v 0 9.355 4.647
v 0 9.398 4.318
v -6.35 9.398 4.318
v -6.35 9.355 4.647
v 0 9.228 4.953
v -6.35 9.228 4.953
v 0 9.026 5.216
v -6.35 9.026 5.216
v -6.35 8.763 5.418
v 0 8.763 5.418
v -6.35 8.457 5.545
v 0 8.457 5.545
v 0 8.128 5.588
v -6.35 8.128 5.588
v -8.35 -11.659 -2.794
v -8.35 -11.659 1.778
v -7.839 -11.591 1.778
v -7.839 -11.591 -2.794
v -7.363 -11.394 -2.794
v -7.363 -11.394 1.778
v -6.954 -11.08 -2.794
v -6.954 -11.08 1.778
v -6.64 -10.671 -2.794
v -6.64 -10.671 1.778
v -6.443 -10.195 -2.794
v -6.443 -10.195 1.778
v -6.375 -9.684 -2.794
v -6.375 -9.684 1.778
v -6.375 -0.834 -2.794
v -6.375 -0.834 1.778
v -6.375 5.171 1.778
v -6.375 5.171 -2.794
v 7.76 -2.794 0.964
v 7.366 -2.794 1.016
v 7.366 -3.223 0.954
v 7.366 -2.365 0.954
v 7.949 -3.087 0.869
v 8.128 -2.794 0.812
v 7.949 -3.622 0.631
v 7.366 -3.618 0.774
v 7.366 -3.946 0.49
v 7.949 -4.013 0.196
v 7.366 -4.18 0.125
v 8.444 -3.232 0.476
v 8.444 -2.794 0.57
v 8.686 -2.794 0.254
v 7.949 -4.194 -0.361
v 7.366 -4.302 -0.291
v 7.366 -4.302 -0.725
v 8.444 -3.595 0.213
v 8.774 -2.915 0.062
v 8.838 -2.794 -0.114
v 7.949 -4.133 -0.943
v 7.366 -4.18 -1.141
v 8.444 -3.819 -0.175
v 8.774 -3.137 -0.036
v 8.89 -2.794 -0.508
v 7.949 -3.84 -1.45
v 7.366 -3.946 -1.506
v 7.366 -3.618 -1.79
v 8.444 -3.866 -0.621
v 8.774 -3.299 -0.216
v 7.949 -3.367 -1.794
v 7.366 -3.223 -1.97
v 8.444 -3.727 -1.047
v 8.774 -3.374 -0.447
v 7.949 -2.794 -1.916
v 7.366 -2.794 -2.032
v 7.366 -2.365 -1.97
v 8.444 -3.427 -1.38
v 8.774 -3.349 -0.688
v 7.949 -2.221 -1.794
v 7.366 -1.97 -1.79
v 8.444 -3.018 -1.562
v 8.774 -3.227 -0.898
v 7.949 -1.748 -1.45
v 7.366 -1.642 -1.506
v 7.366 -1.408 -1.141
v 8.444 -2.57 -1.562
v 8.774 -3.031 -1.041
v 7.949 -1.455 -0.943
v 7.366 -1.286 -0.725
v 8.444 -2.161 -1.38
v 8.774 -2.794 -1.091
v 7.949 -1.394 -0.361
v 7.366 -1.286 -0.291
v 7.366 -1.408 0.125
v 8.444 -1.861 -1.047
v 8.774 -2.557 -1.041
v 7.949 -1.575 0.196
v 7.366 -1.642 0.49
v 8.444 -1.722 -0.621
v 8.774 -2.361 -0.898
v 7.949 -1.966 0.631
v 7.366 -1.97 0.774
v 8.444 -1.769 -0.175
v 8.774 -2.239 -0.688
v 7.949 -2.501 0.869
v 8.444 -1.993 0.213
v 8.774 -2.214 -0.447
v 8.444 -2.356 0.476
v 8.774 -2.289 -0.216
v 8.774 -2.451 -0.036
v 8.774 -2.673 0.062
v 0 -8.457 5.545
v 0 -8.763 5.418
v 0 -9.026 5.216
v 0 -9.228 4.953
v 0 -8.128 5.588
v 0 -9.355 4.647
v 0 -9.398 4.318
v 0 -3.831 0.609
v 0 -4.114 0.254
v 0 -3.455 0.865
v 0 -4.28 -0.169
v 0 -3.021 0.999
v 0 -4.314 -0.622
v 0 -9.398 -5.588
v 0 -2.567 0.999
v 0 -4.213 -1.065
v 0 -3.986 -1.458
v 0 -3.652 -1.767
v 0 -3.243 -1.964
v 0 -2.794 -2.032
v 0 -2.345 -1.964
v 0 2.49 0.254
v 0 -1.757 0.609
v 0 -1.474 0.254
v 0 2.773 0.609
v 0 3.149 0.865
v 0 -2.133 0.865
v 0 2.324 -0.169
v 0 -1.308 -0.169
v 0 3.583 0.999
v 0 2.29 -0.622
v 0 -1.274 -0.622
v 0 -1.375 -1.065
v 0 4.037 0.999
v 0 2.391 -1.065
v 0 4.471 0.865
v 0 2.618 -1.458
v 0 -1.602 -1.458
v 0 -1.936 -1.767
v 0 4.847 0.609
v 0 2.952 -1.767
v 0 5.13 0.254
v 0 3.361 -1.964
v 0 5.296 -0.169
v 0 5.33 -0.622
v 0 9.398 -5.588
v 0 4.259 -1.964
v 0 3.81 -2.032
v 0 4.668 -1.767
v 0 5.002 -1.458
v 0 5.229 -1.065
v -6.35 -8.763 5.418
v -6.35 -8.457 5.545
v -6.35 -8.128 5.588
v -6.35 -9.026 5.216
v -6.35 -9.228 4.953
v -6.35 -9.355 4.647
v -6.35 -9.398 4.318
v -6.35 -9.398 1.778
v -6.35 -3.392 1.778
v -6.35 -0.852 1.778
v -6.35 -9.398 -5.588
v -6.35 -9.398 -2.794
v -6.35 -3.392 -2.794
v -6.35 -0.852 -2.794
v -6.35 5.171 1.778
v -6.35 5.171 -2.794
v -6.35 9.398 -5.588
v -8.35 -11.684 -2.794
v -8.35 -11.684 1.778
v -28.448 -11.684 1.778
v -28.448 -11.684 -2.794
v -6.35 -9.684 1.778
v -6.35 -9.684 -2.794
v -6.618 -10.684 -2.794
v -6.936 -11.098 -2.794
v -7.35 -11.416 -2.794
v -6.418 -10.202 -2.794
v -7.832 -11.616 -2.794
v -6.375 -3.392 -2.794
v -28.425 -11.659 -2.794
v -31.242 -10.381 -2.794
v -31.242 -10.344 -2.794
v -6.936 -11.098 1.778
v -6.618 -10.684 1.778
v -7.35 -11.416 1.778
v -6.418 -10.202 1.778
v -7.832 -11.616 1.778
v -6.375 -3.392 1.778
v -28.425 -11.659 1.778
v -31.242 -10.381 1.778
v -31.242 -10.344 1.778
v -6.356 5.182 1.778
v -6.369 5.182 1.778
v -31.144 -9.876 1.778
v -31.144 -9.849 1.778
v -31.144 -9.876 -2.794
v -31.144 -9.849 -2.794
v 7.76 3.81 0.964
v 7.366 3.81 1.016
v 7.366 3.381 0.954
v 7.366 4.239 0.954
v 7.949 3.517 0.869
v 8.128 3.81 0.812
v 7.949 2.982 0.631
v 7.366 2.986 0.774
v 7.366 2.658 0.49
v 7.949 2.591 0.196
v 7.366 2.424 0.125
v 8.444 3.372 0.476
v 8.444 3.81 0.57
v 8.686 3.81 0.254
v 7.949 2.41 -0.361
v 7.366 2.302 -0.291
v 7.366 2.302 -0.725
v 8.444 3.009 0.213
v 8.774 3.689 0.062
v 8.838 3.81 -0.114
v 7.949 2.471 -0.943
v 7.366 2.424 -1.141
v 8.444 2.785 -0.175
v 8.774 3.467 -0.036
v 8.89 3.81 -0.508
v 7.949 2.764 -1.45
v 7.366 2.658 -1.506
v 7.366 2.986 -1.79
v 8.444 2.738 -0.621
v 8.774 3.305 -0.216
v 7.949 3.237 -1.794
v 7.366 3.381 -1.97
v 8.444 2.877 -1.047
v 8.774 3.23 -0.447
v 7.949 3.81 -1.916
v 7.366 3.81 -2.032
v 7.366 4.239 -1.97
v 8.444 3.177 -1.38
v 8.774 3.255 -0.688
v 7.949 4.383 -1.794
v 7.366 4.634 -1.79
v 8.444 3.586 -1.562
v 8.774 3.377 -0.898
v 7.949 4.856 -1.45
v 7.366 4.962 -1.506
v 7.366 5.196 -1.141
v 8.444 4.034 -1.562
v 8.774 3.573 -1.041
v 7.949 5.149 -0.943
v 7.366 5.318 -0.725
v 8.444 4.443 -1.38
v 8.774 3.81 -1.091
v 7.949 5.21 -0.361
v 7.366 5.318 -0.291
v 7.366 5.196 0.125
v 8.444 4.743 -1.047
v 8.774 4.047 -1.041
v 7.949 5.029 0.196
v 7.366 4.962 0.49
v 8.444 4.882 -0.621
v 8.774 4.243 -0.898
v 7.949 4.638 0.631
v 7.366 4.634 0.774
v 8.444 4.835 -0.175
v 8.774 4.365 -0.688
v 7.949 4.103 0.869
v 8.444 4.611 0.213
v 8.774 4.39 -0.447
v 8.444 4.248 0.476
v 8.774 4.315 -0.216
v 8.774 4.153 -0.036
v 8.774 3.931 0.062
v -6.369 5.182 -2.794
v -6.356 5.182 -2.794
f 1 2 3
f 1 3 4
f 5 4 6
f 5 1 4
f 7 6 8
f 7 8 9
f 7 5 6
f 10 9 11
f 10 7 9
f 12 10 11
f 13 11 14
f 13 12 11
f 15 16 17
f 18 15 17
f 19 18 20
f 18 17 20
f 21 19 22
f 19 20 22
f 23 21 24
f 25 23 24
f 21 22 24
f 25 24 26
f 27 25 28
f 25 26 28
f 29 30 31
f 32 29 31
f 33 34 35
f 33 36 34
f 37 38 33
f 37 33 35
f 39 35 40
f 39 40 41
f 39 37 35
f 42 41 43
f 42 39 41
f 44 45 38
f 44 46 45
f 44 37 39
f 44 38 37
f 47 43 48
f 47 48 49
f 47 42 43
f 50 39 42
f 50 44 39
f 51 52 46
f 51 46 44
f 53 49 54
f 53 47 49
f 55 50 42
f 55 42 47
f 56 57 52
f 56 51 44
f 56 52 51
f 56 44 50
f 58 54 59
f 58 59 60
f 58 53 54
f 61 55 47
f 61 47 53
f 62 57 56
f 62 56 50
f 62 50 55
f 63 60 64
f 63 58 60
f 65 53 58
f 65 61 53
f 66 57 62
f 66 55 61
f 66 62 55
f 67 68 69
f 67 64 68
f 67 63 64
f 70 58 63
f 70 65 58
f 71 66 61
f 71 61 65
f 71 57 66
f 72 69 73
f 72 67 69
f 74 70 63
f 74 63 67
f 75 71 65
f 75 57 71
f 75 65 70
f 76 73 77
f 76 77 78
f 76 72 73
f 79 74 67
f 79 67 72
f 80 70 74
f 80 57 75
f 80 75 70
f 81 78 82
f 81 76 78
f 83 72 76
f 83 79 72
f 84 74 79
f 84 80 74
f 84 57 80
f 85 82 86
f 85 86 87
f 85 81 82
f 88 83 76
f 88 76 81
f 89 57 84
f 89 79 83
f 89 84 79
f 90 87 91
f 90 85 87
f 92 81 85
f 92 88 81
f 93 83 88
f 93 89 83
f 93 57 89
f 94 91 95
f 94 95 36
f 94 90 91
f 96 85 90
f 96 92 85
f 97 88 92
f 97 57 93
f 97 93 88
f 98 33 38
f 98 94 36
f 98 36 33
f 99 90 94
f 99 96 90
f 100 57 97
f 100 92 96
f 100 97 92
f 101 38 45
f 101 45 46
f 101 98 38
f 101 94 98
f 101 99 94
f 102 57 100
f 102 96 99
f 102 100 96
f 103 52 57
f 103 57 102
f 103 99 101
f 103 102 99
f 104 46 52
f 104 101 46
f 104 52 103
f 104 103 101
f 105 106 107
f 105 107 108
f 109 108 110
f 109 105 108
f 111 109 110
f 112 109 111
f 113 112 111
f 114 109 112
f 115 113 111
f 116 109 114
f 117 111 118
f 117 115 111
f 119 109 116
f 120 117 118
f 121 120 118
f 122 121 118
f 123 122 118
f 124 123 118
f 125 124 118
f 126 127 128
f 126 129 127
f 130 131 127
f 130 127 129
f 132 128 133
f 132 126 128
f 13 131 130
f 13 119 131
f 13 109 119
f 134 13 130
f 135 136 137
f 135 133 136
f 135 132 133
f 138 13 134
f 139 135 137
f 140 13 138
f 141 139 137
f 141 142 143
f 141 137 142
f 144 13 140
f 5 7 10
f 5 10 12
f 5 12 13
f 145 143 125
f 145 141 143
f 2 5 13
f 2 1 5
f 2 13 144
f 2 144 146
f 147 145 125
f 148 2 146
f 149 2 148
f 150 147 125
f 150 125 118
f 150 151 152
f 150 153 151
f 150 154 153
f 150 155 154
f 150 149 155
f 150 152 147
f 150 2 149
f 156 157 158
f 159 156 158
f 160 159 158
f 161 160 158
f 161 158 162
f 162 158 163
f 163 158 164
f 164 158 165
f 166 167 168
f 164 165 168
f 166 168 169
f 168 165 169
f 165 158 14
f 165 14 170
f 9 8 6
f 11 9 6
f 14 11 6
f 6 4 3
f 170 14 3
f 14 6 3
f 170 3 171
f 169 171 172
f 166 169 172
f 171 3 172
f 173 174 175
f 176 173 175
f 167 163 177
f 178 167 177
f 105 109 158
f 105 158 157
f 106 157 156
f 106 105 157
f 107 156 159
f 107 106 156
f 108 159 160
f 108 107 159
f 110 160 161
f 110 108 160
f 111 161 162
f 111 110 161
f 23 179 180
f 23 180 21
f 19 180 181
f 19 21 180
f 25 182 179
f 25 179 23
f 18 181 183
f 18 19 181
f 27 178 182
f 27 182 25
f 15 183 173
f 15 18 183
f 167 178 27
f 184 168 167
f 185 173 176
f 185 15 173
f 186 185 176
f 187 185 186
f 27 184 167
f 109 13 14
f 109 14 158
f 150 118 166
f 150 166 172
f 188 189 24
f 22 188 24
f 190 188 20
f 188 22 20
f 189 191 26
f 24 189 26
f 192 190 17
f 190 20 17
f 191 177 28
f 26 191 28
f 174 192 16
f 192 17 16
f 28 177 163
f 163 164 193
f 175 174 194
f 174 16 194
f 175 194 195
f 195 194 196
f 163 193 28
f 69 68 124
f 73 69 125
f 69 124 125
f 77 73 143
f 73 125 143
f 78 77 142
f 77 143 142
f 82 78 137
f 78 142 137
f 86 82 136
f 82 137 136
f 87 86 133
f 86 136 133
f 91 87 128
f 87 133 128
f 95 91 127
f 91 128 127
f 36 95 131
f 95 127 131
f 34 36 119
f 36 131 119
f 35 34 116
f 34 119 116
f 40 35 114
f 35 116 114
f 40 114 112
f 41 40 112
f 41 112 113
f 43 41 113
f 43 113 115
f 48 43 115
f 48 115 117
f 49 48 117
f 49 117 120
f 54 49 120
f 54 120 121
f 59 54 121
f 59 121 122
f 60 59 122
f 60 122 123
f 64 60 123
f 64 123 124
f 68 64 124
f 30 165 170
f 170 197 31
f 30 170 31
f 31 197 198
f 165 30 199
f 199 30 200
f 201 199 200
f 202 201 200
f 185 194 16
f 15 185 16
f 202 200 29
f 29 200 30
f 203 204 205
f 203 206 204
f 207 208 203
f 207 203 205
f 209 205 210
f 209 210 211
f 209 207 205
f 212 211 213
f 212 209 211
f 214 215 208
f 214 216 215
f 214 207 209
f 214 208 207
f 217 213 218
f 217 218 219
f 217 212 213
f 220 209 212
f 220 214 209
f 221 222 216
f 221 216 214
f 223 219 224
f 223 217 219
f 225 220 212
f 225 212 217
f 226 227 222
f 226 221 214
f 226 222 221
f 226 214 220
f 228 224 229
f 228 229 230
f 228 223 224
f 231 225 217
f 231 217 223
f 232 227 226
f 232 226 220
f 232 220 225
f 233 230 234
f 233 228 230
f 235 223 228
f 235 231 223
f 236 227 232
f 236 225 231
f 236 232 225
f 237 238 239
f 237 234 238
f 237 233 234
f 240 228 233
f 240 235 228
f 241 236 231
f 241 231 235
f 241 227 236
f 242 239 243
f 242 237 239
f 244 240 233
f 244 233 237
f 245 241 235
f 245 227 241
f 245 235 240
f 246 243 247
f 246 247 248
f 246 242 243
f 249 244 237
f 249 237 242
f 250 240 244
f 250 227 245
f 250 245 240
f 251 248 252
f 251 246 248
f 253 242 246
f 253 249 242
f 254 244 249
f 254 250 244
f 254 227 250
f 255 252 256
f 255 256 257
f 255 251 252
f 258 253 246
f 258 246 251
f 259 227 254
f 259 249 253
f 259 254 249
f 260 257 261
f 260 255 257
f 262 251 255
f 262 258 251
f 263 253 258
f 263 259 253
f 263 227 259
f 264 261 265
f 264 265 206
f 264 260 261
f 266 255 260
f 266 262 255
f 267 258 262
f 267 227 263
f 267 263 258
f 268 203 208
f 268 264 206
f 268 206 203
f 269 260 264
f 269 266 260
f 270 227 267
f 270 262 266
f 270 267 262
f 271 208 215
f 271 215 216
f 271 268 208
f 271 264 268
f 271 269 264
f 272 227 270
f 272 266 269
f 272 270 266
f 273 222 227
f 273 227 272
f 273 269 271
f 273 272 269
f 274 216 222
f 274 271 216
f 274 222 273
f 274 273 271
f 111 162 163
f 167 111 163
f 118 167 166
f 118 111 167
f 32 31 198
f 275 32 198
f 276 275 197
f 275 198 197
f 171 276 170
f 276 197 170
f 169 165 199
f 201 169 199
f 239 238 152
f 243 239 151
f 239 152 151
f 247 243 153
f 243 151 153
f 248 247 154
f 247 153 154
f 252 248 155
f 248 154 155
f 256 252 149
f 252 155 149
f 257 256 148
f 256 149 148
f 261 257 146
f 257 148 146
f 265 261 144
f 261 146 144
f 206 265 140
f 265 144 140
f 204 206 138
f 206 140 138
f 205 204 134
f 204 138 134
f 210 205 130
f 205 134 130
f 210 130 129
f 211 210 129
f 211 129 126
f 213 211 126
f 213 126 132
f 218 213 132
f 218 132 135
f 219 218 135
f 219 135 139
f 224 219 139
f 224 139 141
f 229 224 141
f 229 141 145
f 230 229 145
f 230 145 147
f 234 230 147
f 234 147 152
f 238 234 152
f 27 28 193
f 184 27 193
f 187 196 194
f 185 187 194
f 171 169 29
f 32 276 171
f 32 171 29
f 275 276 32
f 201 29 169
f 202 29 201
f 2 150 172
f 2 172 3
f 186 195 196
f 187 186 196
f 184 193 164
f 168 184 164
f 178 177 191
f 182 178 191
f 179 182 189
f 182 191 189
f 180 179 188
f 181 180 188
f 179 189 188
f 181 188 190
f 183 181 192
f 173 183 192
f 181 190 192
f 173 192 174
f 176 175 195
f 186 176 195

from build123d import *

# Parameters (mm, degrees)
BOSS_EXTRUDE1_DEPTH = 6.35
SKETCH2_R           = 1.524
BOSS_EXTRUDE2_DEPTH = 7.366
DOME1_FACE_RADIUS   = 1.524
DOME1_HEIGHT        = 1.524
DOME2_FACE_RADIUS   = 1.524
DOME2_HEIGHT        = 1.524
BOSS_EXTRUDE3_DEPTH = 4.572
BOSS_EXTRUDE4_DEPTH = 4.572


with BuildPart() as part:
    # Sketch1 → Boss-Extrude1 (new body)
    with BuildSketch(Plane(origin=(0, 0, 0), x_dir=(0, 0, -1), z_dir=(1, 0, 0))):
        with BuildLine():
            Line((-4.318, -9.398), (5.588, -9.398))
            Line((5.588, -9.398), (5.588, 9.398))
            Line((5.588, 9.398), (-4.318, 9.398))
            ThreePointArc((-4.318, 9.398), (-5.216025612, 9.026025612), (-5.588, 8.128))
            Line((-5.588, 8.128), (-5.588, -8.128))
            ThreePointArc((-5.588, -8.128), (-5.216025612, -9.026025612), (-4.318, -9.398))
        make_face()
    extrude(amount=-BOSS_EXTRUDE1_DEPTH)

    # Sketch2 → Boss-Extrude2 (add)
    with BuildSketch(Plane(origin=(0, 0, 0), x_dir=(0, 0, -1), z_dir=(1, 0, 0))):
        with Locations((0.508, -2.794)):
            Circle(SKETCH2_R)
        with Locations((0.508, 3.81)):
            Circle(SKETCH2_R)
    extrude(amount=BOSS_EXTRUDE2_DEPTH)

    # Dome1: a dome of height H over a round flat face of radius A is a cap of a sphere of radius (A * A + H * H) / (2 * H)
    dome1_r = (DOME1_FACE_RADIUS * DOME1_FACE_RADIUS + DOME1_HEIGHT * DOME1_HEIGHT) / (2 * DOME1_HEIGHT)
    dome1_base = Plane((7.366, 3.81, -0.508), z_dir=(1, 0, 0))
    with Locations(dome1_base.offset(DOME1_HEIGHT - dome1_r)):
        dome1_ball = Sphere(dome1_r, mode=Mode.PRIVATE)
    add(split(dome1_ball, bisect_by=dome1_base, keep=Keep.TOP, mode=Mode.PRIVATE))

    # Dome2: a dome of height H over a round flat face of radius A is a cap of a sphere of radius (A * A + H * H) / (2 * H)
    dome2_r = (DOME2_FACE_RADIUS * DOME2_FACE_RADIUS + DOME2_HEIGHT * DOME2_HEIGHT) / (2 * DOME2_HEIGHT)
    dome2_base = Plane((7.366, -2.794, -0.508), z_dir=(1, 0, 0))
    with Locations(dome2_base.offset(DOME2_HEIGHT - dome2_r)):
        dome2_ball = Sphere(dome2_r, mode=Mode.PRIVATE)
    add(split(dome2_ball, bisect_by=dome2_base, keep=Keep.TOP, mode=Mode.PRIVATE))

    # Sketch6 → Boss-Extrude3 (add)
    with BuildSketch(Plane.XY.offset(1.778)):
        with BuildLine():
            Line((-6.35, -3.391509029), (-6.35, -9.68399892))
            ThreePointArc((-6.35, -9.68399892), (-6.935786754, -11.098213246), (-8.35000108, -11.684))
            Line((-8.35000108, -11.684), (-28.448, -11.684))
            Line((-28.448, -11.684), (-31.242, -10.381136403))
            Line((-31.242, -10.381136403), (-31.242, -10.344325173))
            Line((-31.242, -10.344325173), (-28.424812359, -11.6586))
            Line((-28.424812359, -11.6586), (-8.35000108, -11.6586))
            ThreePointArc((-8.35000108, -11.6586), (-6.953747266, -11.080252734), (-6.3754, -9.68399892))
            Line((-6.3754, -9.68399892), (-6.3754, -3.391509029))
            Line((-6.3754, -3.391509029), (-6.35, -3.391509029))
        make_face()
    extrude(amount=-BOSS_EXTRUDE3_DEPTH)

    # Sketch7 → Boss-Extrude4 (add)
    with BuildSketch(Plane.XY.offset(1.778)):
        with BuildLine():
            Line((-6.35, 5.171328303), (-6.35, -0.851509029))
            Line((-6.35, -0.851509029), (-31.14416134, -9.87584574))
            Line((-31.14416134, -9.87584574), (-31.14416134, -9.848815625))
            Line((-31.14416134, -9.848815625), (-6.3754, -0.833723757))
            Line((-6.3754, -0.833723757), (-6.3754, 5.171328303))
            ThreePointArc((-6.3754, 5.171328303), (-6.3627, 5.184028303), (-6.35, 5.171328303))
        make_face()
    extrude(amount=-BOSS_EXTRUDE4_DEPTH)


solid = part.part
